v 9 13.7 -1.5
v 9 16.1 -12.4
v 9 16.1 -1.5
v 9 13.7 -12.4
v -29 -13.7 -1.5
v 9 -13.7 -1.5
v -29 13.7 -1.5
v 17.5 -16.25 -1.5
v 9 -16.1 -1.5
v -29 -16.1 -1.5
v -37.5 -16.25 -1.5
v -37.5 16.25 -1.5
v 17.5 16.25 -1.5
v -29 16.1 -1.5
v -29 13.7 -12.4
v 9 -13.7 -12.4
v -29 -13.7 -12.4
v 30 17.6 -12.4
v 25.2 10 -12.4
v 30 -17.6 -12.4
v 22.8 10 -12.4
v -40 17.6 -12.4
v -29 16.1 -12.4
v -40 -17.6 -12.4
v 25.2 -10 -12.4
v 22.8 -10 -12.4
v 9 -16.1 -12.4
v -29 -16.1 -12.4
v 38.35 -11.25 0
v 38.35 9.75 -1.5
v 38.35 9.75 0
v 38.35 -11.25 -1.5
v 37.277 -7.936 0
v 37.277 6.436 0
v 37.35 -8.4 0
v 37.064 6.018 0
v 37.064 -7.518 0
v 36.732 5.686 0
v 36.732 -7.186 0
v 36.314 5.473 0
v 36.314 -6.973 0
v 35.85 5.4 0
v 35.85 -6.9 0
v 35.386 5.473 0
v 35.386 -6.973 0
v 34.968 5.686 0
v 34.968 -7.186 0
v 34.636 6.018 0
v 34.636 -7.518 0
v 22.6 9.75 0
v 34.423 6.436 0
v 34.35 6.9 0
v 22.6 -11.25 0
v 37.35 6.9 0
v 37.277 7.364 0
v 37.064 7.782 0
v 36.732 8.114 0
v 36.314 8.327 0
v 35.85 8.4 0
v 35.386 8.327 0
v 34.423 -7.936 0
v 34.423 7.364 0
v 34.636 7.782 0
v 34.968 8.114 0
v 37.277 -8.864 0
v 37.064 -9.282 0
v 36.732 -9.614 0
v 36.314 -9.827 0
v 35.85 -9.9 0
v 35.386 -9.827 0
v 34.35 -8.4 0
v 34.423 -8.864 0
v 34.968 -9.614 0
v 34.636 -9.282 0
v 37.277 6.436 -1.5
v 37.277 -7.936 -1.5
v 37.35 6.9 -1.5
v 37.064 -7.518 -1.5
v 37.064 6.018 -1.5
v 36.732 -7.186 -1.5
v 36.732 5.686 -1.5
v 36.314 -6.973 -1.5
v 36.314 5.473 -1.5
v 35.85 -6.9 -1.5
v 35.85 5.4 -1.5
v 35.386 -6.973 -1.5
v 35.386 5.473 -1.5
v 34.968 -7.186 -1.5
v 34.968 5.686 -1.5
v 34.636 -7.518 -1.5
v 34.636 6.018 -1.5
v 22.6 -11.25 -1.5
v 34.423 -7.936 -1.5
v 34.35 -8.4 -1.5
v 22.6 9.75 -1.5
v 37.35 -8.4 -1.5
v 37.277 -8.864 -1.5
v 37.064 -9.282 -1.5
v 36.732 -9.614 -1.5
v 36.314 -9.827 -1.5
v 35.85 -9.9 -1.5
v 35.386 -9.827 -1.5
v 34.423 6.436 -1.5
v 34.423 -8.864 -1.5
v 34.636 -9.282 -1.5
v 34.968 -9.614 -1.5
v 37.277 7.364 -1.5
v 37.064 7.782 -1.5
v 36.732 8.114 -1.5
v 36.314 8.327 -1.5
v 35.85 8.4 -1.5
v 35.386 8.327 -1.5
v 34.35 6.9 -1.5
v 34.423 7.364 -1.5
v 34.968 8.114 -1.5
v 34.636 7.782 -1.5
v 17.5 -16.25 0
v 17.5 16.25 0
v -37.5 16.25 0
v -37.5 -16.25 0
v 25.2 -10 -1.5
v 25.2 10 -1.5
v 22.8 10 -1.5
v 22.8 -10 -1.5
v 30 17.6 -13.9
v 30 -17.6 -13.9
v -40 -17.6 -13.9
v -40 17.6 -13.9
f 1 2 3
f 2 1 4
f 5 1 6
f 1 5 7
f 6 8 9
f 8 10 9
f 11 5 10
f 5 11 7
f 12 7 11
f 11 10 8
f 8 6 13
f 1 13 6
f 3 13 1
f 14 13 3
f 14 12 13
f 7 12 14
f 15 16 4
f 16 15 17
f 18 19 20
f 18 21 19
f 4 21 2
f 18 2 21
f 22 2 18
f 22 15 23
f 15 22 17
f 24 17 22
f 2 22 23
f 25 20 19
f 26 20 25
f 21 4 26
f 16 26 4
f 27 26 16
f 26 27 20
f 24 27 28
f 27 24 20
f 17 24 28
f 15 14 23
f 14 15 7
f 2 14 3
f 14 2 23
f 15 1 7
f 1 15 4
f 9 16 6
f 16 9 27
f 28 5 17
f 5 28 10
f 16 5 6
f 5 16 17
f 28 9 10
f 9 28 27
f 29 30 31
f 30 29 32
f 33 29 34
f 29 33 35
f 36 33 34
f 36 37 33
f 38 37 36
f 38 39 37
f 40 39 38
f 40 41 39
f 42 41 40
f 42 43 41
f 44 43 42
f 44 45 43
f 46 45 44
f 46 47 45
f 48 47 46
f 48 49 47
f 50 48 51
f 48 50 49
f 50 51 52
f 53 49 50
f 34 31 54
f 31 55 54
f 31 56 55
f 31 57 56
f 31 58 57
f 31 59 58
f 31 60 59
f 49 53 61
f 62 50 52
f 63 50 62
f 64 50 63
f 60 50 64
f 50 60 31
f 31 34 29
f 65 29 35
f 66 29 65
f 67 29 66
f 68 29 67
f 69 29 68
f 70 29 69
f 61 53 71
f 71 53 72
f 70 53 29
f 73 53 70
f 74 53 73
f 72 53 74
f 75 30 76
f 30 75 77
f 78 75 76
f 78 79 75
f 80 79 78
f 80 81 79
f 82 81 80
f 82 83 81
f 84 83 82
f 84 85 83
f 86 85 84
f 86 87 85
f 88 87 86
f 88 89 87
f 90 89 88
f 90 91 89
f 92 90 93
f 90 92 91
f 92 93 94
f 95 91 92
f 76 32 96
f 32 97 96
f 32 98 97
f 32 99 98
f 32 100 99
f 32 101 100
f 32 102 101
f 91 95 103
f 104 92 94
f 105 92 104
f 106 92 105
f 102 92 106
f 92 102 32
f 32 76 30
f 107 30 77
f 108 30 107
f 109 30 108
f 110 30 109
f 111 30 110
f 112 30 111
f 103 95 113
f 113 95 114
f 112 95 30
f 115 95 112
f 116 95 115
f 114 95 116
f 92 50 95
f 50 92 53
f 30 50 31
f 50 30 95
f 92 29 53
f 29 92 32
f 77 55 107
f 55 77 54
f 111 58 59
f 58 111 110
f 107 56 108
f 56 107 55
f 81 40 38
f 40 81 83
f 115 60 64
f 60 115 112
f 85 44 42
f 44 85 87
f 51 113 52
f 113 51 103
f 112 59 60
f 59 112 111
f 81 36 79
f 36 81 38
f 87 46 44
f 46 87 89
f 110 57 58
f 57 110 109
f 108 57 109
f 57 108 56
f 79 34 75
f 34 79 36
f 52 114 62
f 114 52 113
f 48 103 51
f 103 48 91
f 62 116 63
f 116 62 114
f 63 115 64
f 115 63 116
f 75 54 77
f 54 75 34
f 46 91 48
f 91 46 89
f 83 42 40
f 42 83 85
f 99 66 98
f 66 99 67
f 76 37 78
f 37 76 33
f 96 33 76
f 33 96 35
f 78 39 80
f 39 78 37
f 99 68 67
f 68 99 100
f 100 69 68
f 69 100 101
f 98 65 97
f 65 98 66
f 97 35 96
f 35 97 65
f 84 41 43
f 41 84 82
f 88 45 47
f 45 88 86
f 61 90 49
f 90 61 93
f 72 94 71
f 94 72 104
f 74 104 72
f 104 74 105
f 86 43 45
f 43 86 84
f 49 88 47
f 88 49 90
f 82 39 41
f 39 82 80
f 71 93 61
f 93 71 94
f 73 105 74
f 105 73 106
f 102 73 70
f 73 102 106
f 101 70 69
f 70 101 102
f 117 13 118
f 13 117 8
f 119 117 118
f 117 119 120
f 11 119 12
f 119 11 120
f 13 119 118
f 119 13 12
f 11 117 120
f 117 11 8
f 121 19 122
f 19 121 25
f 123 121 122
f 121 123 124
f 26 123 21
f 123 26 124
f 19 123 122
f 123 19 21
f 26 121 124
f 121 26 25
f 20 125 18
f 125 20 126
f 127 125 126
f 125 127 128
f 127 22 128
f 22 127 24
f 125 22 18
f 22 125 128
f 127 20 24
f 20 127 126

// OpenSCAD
// file: variables.scad
innerWidth = 38;
innerLength = 80;
innerHeight = 25;
minEdgeWidth = 2.5;
largeEdgeWidth = 6;
holeRadius = 2;
boxSpacing = 4;
stickRadius = 7.1; // fixed by table

sensorScrewHoleRadius = 2.5/2;

// PCBVariables
	PCBWidth = 35.2;
	PCBBoardLength = 70;
	PCBLength = 80;// 70;
	PCBHeight = 1.5;
	PCBBoardToBoardHeight = 13.9; // height of the two layers of pcb and the pinheaders between them
	
	PCBToBottomSpacing = 3; // space for wires on bottom of PCB
	PCBToTopSpacing = 2; // Air gap between pcb components and stick
	PCBNotchWidth = 1.5; // user definable
	PCBComponentsHeight = 17.1-PCBBoardToBoardHeight; // Height of pCB components on top of top layer pcb

	PCBSensorBoardLength = 15.75;
	PCBSensorBoardWidth = 21;
	PCBSensorBoardOverhang = 7.4; // The length of sensor board that overhangs the main print board
	PCBSensorBoardYOffset = -1.5/2;
	PCBSensorBoardHoleRadius = 1.5;
	PCBSensorBoardHoleCenterYDistance = 12.3+PCBSensorBoardHoleRadius*2;

// BatteryBoxVariables
	batteryRadius = 18.3/2;
	batteryLenght = 65;

// Bolts
	boltHeight = 2.4;
	boltWidth = 5.4;
	boltSegmentWidth = 3.2;

// Switch
	SwitchBaseLength = 9.8;
	SwitchBaseWidth = 13.1;
	SwitchBaseHeight = 8;

	SwitchCylinderRadius = 6/2;
	SwitchCylinderLength = 9;
	SwitchLegLength = 4;

// switch_alt
	SwitchAltWidth = 13;
	SwitchAltHeight = 6;
	SwitchAltDepth = 6;
	SwitchPinLength = 4;
	SwitchAltFlipperHeight = 7;


MaxLength = 85; // fixed by table
MinWidth = max(batteryRadius*4, PCBWidth)+2*largeEdgeWidth;
MinHeight = max(batteryRadius*2, PCBToTopSpacing+PCBComponentsHeight+PCBBoardToBoardHeight+PCBToBottomSpacing)+stickRadius+minEdgeWidth;
// main file
include <variables.scad>

PCB();

module PCB() {
	pinheaderHeight = PCBBoardToBoardHeight-2*PCBHeight;
	pinheaderLength = 38;
	pinheaderWidth = 2.4;
  color(alpha=0.5)
	translate([-(PCBLength-PCBBoardLength), 0, -(PCBBoardToBoardHeight)]) {
		color("Orange")
		translate([(PCBLength-PCBBoardLength)/2, 0, PCBHeight/2])
		cube([PCBBoardLength, PCBWidth, PCBHeight], center=true);
		
		translate([0, 0, PCBHeight]) {
			color("Grey") {
				translate([0, (PCBWidth-pinheaderWidth)/2-PCBNotchWidth, pinheaderHeight/2])
				cube([pinheaderLength, pinheaderWidth, pinheaderHeight], center=true);
				translate([0, -(PCBWidth-pinheaderWidth)/2+PCBNotchWidth, pinheaderHeight/2])
				cube([pinheaderLength, pinheaderWidth, pinheaderHeight], center=true);
			}
			color("Black")
			translate([0, 0, pinheaderHeight+PCBHeight/2])
			cube([55, 32.5, PCBHeight], center=true);

			color("Blue")
			translate([-PCBSensorBoardOverhang, PCBSensorBoardYOffset, 0])
			translate([PCBLength/2, 0, 0])
			translate([PCBSensorBoardLength/2, 0, pinheaderHeight+PCBHeight/2])
			difference() {
				cube([PCBSensorBoardLength, PCBSensorBoardWidth, PCBHeight], center=true);
				translate([PCBSensorBoardLength/2-1-PCBSensorBoardHoleRadius,  (PCBSensorBoardHoleCenterYDistance/2), 0])
				cylinder(10, r=PCBSensorBoardHoleRadius, center=true, $fn=20);
				translate([PCBSensorBoardLength/2-1-PCBSensorBoardHoleRadius, -(PCBSensorBoardHoleCenterYDistance/2), 0])
				cylinder(10, r=PCBSensorBoardHoleRadius, center=true, $fn=20);
			}
			
			color("Grey")
			translate([34, 0, pinheaderHeight/2])
			cube([pinheaderWidth, 20, pinheaderHeight], center=true);
		}
	}
}
